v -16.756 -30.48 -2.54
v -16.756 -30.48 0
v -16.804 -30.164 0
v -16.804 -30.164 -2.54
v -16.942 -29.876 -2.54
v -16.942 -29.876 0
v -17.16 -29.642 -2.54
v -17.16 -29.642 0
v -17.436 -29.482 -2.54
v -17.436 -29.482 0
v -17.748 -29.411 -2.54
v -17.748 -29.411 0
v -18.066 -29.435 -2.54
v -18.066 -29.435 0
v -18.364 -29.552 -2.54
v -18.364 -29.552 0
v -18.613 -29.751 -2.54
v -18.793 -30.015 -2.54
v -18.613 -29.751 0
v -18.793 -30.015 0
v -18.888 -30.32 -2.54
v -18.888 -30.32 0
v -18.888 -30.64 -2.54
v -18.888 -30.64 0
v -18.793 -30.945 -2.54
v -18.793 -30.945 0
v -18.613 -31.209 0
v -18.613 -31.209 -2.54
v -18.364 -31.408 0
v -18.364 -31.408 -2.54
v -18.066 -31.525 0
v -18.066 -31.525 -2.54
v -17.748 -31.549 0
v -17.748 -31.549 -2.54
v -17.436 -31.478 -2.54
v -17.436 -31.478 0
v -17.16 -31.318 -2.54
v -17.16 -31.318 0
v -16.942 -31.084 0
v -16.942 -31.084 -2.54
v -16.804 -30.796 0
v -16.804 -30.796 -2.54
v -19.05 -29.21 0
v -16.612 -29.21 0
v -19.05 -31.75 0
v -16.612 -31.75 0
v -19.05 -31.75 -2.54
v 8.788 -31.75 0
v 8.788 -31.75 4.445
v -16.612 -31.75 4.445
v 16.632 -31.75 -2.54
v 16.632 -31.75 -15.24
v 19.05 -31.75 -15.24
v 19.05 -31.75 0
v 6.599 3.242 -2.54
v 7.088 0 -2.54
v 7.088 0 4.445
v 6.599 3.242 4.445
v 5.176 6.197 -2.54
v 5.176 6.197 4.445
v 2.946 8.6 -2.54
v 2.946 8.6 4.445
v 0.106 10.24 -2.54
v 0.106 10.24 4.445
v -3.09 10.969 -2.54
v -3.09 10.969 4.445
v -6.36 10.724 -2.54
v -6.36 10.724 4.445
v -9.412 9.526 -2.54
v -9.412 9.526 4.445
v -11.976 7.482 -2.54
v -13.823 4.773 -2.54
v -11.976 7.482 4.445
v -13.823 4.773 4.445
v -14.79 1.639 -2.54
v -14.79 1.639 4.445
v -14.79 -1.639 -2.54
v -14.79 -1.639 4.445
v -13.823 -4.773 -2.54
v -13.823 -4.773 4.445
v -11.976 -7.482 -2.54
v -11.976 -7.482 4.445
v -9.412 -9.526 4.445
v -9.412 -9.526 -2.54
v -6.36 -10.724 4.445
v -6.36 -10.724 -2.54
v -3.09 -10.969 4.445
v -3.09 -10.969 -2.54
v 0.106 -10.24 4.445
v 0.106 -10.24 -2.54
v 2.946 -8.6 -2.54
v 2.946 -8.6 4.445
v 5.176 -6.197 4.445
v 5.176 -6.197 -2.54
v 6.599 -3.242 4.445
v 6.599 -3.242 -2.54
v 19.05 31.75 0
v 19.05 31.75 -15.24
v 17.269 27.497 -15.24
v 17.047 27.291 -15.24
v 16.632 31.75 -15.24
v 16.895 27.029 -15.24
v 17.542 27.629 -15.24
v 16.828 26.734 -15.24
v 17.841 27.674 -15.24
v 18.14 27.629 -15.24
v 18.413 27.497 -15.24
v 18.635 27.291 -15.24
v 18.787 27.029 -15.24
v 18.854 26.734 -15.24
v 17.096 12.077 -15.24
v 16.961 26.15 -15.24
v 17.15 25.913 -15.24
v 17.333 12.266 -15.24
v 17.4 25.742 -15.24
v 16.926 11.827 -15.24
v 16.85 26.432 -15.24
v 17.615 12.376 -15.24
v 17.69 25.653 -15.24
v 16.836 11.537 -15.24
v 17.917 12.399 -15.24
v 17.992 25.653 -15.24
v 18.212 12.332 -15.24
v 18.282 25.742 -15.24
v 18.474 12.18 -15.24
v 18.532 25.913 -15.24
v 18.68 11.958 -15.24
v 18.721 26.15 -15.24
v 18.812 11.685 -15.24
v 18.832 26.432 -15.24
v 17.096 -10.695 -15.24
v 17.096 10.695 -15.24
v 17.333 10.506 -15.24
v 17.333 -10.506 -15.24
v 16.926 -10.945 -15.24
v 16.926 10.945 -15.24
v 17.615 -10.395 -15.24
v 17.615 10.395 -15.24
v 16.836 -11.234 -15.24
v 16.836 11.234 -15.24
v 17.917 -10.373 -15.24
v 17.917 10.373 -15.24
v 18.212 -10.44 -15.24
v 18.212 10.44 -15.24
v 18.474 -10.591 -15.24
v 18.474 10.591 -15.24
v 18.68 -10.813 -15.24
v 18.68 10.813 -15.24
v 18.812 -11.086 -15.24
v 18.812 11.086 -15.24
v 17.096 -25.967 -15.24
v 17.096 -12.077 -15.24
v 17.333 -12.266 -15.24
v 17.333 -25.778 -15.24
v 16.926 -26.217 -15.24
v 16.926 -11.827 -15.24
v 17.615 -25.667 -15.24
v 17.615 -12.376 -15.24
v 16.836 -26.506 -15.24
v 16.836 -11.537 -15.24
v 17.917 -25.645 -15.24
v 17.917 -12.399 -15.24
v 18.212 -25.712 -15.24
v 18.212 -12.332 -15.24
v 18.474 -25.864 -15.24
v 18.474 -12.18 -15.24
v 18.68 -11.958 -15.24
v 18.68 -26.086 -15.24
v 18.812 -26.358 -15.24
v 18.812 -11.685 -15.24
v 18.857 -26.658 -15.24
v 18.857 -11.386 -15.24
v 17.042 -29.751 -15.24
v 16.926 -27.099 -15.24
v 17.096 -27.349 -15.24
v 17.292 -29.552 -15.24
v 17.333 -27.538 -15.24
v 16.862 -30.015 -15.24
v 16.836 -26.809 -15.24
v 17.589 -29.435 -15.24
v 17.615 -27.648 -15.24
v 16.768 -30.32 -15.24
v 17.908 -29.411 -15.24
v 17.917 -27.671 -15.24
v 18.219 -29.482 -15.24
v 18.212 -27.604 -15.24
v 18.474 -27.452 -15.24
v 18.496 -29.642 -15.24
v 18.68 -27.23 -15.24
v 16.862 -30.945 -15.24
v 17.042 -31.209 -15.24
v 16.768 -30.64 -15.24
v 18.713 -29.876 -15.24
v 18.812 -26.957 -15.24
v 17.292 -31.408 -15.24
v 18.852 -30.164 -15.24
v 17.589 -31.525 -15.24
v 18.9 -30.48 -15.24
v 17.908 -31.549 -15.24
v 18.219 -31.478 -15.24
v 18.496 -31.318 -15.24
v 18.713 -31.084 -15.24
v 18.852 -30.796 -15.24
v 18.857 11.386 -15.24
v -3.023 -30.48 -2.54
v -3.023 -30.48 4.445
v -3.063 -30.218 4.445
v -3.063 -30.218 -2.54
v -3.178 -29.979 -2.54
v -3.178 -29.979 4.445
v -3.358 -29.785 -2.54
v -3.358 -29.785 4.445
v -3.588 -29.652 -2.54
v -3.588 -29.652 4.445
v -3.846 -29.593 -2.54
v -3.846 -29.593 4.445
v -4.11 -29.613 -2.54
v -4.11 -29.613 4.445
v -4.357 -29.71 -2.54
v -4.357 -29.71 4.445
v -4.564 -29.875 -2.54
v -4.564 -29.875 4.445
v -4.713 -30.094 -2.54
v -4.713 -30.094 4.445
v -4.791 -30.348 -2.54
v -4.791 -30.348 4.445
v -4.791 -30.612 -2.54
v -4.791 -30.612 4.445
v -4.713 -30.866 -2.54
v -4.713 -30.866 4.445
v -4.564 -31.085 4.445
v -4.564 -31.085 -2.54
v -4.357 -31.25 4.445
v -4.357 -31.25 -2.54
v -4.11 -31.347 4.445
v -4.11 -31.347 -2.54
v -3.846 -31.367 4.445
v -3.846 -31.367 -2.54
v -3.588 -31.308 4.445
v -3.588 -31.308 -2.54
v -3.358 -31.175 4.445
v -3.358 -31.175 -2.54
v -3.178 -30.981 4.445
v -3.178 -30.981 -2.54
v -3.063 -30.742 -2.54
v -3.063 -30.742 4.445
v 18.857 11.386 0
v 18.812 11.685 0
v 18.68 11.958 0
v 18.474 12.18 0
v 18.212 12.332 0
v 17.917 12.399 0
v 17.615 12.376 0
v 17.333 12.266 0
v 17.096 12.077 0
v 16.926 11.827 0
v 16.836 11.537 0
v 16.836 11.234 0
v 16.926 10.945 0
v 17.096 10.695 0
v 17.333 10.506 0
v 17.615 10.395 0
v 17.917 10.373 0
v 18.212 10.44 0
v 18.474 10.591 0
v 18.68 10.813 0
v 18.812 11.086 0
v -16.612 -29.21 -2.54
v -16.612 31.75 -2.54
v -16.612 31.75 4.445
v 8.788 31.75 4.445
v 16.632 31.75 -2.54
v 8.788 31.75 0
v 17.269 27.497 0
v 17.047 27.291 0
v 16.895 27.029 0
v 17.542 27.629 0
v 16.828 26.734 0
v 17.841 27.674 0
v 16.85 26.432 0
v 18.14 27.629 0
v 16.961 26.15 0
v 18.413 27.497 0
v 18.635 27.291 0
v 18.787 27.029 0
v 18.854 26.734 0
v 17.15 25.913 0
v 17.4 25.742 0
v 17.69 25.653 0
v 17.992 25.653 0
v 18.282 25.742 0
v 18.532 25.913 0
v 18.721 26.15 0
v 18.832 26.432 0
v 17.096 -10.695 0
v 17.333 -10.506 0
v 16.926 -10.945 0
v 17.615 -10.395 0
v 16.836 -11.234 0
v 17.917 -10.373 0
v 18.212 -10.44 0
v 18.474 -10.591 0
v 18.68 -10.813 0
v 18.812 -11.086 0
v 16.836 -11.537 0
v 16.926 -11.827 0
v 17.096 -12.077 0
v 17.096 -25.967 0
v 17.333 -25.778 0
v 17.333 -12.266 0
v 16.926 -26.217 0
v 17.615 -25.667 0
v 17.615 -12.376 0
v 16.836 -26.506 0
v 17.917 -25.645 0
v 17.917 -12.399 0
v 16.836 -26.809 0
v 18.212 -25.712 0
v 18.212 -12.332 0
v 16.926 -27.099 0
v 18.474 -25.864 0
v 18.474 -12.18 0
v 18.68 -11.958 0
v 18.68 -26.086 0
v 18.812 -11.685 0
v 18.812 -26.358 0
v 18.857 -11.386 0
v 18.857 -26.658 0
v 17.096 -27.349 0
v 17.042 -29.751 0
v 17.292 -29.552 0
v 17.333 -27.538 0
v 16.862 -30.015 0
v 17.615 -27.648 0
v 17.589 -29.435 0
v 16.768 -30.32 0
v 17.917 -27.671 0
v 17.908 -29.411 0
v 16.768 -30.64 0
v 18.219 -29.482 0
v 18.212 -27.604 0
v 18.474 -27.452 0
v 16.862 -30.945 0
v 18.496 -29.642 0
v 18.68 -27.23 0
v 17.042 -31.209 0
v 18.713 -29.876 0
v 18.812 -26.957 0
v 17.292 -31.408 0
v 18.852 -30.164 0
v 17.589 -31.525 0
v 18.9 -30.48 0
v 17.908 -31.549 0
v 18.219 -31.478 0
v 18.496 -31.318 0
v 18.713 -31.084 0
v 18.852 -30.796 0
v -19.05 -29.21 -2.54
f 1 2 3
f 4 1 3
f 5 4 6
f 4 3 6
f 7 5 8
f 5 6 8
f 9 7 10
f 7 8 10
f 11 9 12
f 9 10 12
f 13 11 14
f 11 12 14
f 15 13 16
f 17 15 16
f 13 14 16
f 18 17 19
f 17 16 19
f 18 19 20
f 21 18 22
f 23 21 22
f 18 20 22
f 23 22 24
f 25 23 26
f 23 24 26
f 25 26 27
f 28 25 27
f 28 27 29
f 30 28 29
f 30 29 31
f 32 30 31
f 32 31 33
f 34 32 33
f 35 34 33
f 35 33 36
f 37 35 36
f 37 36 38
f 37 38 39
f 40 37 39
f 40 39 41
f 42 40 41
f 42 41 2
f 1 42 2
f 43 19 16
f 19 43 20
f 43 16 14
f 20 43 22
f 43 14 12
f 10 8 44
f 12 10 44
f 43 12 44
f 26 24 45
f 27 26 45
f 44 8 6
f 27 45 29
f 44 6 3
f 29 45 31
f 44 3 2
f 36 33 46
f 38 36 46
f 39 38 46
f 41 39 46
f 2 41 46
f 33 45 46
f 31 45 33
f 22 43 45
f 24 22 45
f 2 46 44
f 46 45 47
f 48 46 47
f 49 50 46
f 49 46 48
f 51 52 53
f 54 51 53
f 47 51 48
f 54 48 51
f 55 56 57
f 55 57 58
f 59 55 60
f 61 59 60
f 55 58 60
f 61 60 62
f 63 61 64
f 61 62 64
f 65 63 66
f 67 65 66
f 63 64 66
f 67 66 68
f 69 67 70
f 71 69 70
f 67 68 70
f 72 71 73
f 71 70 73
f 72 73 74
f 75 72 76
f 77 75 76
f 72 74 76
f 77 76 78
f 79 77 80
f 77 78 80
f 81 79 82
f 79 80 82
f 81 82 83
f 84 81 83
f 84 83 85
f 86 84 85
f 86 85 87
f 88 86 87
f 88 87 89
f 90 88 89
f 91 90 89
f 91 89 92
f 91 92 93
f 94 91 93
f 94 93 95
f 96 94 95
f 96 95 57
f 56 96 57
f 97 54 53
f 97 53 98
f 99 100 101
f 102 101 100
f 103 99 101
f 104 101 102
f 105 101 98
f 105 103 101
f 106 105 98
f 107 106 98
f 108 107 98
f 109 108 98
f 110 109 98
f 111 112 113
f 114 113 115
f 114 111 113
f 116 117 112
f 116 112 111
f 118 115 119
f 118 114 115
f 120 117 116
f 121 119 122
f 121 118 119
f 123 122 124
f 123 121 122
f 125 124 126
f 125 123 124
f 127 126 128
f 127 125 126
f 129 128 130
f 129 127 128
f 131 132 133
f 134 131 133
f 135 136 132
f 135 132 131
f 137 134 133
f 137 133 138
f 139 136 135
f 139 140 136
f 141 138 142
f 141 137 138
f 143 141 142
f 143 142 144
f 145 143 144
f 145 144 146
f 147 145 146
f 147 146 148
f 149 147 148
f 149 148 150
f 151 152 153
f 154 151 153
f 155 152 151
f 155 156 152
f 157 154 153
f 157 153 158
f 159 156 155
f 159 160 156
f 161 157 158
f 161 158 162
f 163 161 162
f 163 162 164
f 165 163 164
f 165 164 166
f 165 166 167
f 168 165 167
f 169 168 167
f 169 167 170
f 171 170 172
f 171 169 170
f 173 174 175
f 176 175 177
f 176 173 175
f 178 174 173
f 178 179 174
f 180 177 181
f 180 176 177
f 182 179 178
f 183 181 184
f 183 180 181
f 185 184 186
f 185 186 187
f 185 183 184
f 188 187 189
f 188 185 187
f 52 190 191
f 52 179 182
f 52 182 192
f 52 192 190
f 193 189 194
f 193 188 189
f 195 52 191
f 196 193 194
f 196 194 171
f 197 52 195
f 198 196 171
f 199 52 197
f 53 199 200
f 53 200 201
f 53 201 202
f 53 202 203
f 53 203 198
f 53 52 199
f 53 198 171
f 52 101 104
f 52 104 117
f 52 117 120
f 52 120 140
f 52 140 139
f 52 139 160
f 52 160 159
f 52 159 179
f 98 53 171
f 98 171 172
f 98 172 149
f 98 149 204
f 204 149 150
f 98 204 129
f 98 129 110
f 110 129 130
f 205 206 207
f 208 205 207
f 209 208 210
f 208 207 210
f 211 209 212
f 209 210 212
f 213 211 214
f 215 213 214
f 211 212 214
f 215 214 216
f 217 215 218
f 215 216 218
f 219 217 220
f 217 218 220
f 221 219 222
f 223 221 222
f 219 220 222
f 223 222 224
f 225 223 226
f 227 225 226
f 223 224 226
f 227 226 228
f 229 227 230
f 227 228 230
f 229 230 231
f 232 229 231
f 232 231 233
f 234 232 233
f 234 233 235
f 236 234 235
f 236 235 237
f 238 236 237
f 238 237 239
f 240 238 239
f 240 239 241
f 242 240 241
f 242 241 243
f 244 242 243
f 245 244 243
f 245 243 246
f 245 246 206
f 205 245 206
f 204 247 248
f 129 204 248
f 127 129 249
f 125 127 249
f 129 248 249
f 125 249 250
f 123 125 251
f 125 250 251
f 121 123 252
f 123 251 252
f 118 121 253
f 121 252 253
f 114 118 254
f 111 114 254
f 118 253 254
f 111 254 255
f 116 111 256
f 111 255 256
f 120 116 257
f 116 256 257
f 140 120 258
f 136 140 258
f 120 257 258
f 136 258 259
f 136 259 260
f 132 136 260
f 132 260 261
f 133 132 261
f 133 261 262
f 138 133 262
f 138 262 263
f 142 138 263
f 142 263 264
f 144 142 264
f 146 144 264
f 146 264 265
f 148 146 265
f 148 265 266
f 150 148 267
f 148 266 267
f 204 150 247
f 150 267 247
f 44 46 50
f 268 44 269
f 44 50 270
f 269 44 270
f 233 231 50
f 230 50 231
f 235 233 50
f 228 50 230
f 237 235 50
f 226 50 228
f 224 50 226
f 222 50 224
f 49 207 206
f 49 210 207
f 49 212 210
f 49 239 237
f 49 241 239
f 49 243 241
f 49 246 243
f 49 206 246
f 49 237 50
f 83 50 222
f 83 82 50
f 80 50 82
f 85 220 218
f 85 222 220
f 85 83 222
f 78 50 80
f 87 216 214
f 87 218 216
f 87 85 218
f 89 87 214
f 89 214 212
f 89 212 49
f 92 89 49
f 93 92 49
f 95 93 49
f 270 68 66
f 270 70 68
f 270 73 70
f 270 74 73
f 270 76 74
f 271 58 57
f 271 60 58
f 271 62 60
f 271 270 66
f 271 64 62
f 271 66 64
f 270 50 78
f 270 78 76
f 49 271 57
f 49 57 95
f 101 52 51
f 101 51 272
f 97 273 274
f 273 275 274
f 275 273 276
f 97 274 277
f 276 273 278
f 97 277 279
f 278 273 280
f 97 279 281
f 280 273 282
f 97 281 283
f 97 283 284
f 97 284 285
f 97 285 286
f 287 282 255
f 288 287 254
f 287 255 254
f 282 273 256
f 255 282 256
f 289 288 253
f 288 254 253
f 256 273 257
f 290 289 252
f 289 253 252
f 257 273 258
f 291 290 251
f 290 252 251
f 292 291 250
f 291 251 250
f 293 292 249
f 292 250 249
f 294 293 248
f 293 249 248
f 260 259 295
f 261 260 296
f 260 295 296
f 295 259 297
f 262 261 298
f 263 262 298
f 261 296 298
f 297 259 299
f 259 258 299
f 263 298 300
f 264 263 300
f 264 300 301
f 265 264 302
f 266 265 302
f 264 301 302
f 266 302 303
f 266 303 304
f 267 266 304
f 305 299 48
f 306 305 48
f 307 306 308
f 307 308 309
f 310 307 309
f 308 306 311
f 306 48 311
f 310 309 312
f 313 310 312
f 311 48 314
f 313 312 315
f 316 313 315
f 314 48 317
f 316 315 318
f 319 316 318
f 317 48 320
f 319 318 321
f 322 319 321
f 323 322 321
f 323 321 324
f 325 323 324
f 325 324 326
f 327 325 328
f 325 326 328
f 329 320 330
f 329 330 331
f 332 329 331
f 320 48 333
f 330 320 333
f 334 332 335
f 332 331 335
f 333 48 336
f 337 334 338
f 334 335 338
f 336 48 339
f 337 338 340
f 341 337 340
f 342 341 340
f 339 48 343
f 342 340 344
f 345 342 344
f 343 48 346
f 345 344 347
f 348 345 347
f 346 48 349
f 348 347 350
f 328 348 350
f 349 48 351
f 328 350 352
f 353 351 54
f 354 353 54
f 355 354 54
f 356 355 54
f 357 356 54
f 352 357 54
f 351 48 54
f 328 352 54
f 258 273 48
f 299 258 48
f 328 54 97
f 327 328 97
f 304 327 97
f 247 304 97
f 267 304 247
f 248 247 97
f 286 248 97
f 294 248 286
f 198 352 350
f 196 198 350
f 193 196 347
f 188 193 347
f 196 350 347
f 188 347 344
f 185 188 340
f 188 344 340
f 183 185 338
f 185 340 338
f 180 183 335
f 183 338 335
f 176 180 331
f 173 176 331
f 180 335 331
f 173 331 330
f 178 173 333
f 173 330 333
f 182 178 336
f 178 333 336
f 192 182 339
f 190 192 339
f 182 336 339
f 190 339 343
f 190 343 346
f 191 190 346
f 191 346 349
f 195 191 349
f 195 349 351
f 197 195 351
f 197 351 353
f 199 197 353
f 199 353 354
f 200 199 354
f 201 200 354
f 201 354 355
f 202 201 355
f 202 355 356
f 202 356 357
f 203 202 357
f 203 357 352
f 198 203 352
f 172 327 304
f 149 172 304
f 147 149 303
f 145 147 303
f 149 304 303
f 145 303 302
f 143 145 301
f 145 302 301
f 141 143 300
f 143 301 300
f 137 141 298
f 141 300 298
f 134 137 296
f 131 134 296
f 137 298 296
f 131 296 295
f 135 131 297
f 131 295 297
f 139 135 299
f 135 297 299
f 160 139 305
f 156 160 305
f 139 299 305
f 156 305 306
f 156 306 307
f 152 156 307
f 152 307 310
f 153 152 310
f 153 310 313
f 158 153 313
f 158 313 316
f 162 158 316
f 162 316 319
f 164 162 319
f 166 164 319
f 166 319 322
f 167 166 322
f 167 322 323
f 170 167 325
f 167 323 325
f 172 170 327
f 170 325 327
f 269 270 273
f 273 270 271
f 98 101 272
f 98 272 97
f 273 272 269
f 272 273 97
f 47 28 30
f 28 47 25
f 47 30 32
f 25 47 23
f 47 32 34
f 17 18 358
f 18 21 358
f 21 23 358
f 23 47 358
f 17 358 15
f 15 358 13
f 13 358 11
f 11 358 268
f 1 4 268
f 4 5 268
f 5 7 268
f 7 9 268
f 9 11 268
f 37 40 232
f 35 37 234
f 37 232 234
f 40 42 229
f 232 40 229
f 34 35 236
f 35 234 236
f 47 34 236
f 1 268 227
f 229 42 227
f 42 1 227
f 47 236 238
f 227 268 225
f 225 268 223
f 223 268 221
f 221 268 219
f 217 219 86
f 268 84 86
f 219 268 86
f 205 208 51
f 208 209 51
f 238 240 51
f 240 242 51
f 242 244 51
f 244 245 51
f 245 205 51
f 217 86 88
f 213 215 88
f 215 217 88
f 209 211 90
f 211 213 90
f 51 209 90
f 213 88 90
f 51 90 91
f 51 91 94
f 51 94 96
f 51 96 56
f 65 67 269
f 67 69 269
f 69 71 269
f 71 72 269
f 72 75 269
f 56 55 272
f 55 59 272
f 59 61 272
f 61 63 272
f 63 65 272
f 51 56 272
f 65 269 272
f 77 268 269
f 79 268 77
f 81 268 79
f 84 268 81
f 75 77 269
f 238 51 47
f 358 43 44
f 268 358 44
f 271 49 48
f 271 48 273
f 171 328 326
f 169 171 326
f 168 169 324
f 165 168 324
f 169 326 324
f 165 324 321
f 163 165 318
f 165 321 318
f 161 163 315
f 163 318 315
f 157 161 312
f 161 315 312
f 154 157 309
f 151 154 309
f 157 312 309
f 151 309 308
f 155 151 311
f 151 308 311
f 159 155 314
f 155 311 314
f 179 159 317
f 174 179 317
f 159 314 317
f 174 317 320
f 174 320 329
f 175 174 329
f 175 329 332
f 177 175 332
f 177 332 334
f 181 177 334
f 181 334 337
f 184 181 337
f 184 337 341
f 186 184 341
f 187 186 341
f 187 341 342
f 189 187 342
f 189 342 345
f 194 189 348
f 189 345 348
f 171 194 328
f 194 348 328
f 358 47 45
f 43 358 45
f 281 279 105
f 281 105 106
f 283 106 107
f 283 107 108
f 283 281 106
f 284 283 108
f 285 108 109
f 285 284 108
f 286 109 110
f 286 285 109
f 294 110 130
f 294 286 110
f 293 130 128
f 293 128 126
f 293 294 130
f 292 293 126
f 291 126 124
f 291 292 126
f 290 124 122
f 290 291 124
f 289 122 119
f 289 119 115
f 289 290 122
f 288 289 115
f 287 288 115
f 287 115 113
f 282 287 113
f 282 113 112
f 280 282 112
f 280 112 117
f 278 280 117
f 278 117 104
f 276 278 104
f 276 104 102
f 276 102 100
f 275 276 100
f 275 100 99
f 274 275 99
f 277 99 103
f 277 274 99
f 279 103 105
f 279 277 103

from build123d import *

# Parameters (mm, degrees)
SKETCH1_R             = 1.016
BOSS_EXTRUDE1_DEPTH   = 15.24
BOSS_EXTRUDE1_2_DEPTH = 15.24
SKETCH2_W             = 33.244360662
SKETCH2_H             = 63.5
BOSS_EXTRUDE2_DEPTH   = 2.54
SKETCH3_W             = 38.1
SKETCH3_H             = 15.24
BOSS_EXTRUDE3_DEPTH   = 2.54
SKETCH4_R             = 1.016
CUT_EXTRUDE1_DEPTH    = 41.040262237
SKETCH5_R             = 1.071714946
CUT_EXTRUDE2_DEPTH    = 41.040262237
SKETCH6_R             = 11.0000034
CUT_EXTRUDE4_DEPTH    = 41.040262237
BOSS_EXTRUDE4_START   = 4.445
SKETCH7_W             = 25.4
SKETCH7_H             = 63.5
SKETCH7_R             = 11.0000034
BOSS_EXTRUDE4_DEPTH   = 4.445
SKETCH8_W             = 35.681993508
SKETCH8_H             = 2.54
CUT_EXTRUDE5_DEPTH    = 12.7
SKETCH9_R             = 0.889
CUT_EXTRUDE6_DEPTH    = 12.7


with BuildPart() as part:
    # Sketch1 → Boss-Extrude1 (new body)
    with BuildSketch(Plane.XY):
        Polygon((19.05, 0), (19.05, 31.75), (17.840996754, 31.75), (16.631993508, 31.75), (16.631993508, -31.75), (19.05, -31.75), align=None)
        with Locations((17.840996754, -26.657844962)):
            Circle(SKETCH1_R, mode=Mode.SUBTRACT)
        with Locations((17.840996754, -11.385809707)):
            Circle(SKETCH1_R, mode=Mode.SUBTRACT)
        with Locations((17.840996754, 11.385809707)):
            Circle(SKETCH1_R, mode=Mode.SUBTRACT)
        with BuildLine():
            ThreePointArc((17.840996754, 25.641844962), (16.824996754, 26.657844962), (17.840996754, 27.673844962))
            ThreePointArc((17.840996754, 27.673844962), (18.856996754, 26.657844962), (17.840996754, 25.641844962))
        make_face(mode=Mode.SUBTRACT)
    extrude(amount=-BOSS_EXTRUDE1_DEPTH)

    # Sketch2 → Boss-Extrude2 (add)
    with BuildSketch(Plane.XY):
        with Locations((0.009813177, 0)):
            Rectangle(SKETCH2_W, SKETCH2_H)
    extrude(amount=-BOSS_EXTRUDE2_DEPTH)

    # Sketch3 → Boss-Extrude3 (add)
    with BuildSketch(Plane.XZ.offset(31.75)):
        with Locations((0, -7.62)):
            Rectangle(SKETCH3_W, SKETCH3_H)
    extrude(amount=-BOSS_EXTRUDE3_DEPTH)

    # Sketch5 → Cut-Extrude2 (cut, through all)
    with BuildSketch(Plane.XY):
        with Locations((-17.827792249, -30.48)):
            Circle(SKETCH5_R)
        with Locations((17.827792249, -30.48)):
            Circle(SKETCH5_R)
    extrude(amount=-CUT_EXTRUDE2_DEPTH, mode=Mode.SUBTRACT)

    # Sketch6 → Cut-Extrude4 (cut, through all)
    with BuildSketch(Plane.XY):
        with Locations((-3.912367154, 0)):
            Circle(SKETCH6_R)
    extrude(amount=-CUT_EXTRUDE4_DEPTH, mode=Mode.SUBTRACT)

    # Sketch7 → Boss-Extrude4 (add)
    with BuildSketch(Plane.XY.offset(BOSS_EXTRUDE4_START)):
        with Locations((-3.912367154, 0)):
            Rectangle(SKETCH7_W, SKETCH7_H)
        with Locations((-3.912367154, 0)):
            Circle(SKETCH7_R, mode=Mode.SUBTRACT)
    extrude(amount=-BOSS_EXTRUDE4_DEPTH)

    # Sketch8 → Cut-Extrude5 (cut)
    with BuildSketch(Plane(origin=(0, 0, -15.24), x_dir=(-1, 0, 0), z_dir=(0, 0, -1))):
        with Locations((1.209003246, -30.48)):
            Rectangle(SKETCH8_W, SKETCH8_H)
    extrude(amount=-CUT_EXTRUDE5_DEPTH, mode=Mode.SUBTRACT)

    # Sketch9 → Cut-Extrude6 (cut)
    with BuildSketch(Plane.XY.offset(4.445)):
        with Locations((-3.912367154, -30.48)):
            Circle(SKETCH9_R)
    extrude(amount=-CUT_EXTRUDE6_DEPTH, mode=Mode.SUBTRACT)


with BuildPart() as body_2:
    # Sketch1 → Boss-Extrude1 2 (new body)
    with BuildSketch(Plane.XY):
        with Locations((-17.840996754, -26.657844962)):
            Circle(SKETCH1_R)
    extrude(amount=-BOSS_EXTRUDE1_2_DEPTH)

    # Sketch4 → Cut-Extrude1 (cut, through all)
    with BuildSketch(Plane.XY):
        with Locations((-17.840996754, -26.657844962)):
            Circle(SKETCH4_R)
    extrude(amount=-CUT_EXTRUDE1_DEPTH, mode=Mode.SUBTRACT)


solid = part.part
